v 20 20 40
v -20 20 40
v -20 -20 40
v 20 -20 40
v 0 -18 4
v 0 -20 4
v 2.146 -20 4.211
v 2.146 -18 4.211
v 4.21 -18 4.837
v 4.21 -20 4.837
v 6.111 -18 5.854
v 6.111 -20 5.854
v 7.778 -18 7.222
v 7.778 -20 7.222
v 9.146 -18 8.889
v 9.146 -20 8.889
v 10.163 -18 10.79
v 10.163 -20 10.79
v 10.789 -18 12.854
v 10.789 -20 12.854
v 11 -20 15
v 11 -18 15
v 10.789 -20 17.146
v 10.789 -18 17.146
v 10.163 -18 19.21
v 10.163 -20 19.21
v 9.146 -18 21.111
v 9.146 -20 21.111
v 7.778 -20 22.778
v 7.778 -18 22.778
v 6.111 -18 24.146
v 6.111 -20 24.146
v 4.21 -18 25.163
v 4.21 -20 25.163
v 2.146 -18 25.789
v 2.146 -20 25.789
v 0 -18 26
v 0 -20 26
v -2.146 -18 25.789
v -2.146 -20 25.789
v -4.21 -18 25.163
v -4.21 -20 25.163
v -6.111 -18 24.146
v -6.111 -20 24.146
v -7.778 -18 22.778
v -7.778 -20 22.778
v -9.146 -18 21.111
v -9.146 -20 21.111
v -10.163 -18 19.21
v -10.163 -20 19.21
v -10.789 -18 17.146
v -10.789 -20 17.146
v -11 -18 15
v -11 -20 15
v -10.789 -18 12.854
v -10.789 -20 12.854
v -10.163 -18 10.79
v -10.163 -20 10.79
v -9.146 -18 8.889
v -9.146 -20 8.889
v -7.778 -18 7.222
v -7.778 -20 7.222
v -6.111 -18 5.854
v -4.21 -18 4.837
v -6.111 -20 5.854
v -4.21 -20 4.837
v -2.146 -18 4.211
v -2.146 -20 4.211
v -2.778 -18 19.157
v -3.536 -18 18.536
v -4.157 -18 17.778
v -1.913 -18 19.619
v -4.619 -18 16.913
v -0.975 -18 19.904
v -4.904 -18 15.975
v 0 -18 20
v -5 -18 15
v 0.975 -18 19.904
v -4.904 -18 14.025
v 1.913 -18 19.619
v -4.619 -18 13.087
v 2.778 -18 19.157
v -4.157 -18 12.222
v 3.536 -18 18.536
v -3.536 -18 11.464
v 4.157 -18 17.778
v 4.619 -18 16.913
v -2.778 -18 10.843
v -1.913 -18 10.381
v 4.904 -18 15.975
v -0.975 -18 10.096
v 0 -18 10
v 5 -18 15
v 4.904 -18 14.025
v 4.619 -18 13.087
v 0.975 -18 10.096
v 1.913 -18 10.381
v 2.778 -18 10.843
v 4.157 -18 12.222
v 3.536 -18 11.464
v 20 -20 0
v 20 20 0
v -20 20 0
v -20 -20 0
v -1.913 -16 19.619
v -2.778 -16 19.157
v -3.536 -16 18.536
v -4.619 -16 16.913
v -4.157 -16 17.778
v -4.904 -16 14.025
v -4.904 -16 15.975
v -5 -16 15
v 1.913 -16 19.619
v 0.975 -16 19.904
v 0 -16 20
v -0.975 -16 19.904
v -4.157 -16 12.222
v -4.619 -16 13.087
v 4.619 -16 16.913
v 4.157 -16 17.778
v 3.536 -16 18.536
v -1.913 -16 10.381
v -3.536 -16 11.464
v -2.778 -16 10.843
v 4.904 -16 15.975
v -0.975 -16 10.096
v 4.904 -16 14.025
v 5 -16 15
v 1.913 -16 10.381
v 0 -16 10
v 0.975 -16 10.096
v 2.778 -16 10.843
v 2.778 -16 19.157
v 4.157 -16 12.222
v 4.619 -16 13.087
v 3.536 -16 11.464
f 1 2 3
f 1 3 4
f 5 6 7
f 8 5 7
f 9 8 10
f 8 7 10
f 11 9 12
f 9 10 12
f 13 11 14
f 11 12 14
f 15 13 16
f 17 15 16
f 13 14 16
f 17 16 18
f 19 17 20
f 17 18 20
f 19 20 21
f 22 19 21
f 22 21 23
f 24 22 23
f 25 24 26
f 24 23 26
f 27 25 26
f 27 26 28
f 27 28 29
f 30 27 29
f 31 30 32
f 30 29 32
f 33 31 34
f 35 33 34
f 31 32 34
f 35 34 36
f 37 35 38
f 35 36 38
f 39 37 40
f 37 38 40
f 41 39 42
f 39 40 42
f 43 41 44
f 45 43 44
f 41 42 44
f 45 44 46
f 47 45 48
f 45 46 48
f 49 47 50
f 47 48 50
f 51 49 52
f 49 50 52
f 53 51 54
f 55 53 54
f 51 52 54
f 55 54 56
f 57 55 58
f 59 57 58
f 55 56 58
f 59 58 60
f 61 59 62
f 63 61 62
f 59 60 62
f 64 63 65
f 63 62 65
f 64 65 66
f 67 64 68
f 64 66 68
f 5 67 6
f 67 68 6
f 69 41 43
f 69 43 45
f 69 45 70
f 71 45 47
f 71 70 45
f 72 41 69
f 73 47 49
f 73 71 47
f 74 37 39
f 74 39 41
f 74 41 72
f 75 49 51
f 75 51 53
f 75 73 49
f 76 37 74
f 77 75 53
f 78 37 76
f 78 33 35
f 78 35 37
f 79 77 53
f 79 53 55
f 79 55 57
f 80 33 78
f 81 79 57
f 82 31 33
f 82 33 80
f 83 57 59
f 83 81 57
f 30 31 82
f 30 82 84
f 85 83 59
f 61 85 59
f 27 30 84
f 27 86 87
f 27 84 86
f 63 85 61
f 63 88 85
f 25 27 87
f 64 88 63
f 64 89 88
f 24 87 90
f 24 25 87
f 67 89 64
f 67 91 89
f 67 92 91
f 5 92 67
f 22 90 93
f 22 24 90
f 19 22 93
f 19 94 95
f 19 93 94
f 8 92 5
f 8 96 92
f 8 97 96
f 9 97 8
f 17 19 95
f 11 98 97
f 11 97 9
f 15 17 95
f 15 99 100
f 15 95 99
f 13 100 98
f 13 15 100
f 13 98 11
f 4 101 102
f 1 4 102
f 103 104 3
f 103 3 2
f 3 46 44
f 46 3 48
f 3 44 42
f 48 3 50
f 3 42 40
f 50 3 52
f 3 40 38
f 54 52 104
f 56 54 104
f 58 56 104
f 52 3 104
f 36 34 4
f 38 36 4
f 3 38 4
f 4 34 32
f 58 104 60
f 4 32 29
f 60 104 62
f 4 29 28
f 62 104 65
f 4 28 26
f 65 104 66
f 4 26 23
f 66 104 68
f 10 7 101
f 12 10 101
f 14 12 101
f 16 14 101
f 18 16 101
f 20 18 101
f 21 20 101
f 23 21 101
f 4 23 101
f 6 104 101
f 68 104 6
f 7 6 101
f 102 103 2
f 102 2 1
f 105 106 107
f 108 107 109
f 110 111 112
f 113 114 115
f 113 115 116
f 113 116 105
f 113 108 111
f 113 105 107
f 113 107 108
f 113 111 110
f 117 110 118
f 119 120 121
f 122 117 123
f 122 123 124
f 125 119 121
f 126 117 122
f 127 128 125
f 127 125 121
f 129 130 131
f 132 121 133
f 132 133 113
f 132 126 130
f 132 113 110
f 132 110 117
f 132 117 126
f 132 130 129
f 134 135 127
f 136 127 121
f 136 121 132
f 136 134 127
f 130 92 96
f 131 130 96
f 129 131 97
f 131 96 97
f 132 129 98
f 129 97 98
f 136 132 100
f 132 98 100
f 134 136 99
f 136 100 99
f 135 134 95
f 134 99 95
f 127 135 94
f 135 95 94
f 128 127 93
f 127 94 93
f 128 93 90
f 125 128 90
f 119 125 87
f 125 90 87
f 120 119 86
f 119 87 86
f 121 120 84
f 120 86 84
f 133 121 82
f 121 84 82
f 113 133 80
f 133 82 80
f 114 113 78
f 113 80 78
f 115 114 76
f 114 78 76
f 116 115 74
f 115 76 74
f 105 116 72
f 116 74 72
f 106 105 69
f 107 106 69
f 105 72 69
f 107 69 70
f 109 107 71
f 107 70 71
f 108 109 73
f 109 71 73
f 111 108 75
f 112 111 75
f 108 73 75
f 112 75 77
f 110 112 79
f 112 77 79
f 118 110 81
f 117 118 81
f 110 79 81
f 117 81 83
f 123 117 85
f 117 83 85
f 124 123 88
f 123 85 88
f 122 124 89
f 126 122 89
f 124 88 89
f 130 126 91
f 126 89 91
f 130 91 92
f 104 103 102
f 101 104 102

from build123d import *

# Parameters (mm, degrees)
SKETCH1_W           = 40
SKETCH1_H           = 40
BOSS_EXTRUDE1_DEPTH = 40
SKETCH2_R           = 11
CUT_EXTRUDE1_DEPTH  = 2
SKETCH3_R           = 5
CUT_EXTRUDE2_DEPTH  = 2


with BuildPart() as part:
    # Sketch1 → Boss-Extrude1 (new body)
    with BuildSketch(Plane.XY):
        Rectangle(SKETCH1_W, SKETCH1_H)
    extrude(amount=BOSS_EXTRUDE1_DEPTH)

    # Sketch2 → Cut-Extrude1 (cut)
    with BuildSketch(Plane.XZ.offset(20)):
        with Locations(Location((0, 15, 0), (0, 0, 270))):
            Circle(SKETCH2_R)
    extrude(amount=-CUT_EXTRUDE1_DEPTH, mode=Mode.SUBTRACT)

    # Sketch3 → Cut-Extrude2 (cut)
    with BuildSketch(Plane.XZ.offset(18)):
        with Locations(Location((0, 15, 0), (0, 0, 270))):
            Circle(SKETCH3_R)
    extrude(amount=-CUT_EXTRUDE2_DEPTH, mode=Mode.SUBTRACT)


solid = part.part
